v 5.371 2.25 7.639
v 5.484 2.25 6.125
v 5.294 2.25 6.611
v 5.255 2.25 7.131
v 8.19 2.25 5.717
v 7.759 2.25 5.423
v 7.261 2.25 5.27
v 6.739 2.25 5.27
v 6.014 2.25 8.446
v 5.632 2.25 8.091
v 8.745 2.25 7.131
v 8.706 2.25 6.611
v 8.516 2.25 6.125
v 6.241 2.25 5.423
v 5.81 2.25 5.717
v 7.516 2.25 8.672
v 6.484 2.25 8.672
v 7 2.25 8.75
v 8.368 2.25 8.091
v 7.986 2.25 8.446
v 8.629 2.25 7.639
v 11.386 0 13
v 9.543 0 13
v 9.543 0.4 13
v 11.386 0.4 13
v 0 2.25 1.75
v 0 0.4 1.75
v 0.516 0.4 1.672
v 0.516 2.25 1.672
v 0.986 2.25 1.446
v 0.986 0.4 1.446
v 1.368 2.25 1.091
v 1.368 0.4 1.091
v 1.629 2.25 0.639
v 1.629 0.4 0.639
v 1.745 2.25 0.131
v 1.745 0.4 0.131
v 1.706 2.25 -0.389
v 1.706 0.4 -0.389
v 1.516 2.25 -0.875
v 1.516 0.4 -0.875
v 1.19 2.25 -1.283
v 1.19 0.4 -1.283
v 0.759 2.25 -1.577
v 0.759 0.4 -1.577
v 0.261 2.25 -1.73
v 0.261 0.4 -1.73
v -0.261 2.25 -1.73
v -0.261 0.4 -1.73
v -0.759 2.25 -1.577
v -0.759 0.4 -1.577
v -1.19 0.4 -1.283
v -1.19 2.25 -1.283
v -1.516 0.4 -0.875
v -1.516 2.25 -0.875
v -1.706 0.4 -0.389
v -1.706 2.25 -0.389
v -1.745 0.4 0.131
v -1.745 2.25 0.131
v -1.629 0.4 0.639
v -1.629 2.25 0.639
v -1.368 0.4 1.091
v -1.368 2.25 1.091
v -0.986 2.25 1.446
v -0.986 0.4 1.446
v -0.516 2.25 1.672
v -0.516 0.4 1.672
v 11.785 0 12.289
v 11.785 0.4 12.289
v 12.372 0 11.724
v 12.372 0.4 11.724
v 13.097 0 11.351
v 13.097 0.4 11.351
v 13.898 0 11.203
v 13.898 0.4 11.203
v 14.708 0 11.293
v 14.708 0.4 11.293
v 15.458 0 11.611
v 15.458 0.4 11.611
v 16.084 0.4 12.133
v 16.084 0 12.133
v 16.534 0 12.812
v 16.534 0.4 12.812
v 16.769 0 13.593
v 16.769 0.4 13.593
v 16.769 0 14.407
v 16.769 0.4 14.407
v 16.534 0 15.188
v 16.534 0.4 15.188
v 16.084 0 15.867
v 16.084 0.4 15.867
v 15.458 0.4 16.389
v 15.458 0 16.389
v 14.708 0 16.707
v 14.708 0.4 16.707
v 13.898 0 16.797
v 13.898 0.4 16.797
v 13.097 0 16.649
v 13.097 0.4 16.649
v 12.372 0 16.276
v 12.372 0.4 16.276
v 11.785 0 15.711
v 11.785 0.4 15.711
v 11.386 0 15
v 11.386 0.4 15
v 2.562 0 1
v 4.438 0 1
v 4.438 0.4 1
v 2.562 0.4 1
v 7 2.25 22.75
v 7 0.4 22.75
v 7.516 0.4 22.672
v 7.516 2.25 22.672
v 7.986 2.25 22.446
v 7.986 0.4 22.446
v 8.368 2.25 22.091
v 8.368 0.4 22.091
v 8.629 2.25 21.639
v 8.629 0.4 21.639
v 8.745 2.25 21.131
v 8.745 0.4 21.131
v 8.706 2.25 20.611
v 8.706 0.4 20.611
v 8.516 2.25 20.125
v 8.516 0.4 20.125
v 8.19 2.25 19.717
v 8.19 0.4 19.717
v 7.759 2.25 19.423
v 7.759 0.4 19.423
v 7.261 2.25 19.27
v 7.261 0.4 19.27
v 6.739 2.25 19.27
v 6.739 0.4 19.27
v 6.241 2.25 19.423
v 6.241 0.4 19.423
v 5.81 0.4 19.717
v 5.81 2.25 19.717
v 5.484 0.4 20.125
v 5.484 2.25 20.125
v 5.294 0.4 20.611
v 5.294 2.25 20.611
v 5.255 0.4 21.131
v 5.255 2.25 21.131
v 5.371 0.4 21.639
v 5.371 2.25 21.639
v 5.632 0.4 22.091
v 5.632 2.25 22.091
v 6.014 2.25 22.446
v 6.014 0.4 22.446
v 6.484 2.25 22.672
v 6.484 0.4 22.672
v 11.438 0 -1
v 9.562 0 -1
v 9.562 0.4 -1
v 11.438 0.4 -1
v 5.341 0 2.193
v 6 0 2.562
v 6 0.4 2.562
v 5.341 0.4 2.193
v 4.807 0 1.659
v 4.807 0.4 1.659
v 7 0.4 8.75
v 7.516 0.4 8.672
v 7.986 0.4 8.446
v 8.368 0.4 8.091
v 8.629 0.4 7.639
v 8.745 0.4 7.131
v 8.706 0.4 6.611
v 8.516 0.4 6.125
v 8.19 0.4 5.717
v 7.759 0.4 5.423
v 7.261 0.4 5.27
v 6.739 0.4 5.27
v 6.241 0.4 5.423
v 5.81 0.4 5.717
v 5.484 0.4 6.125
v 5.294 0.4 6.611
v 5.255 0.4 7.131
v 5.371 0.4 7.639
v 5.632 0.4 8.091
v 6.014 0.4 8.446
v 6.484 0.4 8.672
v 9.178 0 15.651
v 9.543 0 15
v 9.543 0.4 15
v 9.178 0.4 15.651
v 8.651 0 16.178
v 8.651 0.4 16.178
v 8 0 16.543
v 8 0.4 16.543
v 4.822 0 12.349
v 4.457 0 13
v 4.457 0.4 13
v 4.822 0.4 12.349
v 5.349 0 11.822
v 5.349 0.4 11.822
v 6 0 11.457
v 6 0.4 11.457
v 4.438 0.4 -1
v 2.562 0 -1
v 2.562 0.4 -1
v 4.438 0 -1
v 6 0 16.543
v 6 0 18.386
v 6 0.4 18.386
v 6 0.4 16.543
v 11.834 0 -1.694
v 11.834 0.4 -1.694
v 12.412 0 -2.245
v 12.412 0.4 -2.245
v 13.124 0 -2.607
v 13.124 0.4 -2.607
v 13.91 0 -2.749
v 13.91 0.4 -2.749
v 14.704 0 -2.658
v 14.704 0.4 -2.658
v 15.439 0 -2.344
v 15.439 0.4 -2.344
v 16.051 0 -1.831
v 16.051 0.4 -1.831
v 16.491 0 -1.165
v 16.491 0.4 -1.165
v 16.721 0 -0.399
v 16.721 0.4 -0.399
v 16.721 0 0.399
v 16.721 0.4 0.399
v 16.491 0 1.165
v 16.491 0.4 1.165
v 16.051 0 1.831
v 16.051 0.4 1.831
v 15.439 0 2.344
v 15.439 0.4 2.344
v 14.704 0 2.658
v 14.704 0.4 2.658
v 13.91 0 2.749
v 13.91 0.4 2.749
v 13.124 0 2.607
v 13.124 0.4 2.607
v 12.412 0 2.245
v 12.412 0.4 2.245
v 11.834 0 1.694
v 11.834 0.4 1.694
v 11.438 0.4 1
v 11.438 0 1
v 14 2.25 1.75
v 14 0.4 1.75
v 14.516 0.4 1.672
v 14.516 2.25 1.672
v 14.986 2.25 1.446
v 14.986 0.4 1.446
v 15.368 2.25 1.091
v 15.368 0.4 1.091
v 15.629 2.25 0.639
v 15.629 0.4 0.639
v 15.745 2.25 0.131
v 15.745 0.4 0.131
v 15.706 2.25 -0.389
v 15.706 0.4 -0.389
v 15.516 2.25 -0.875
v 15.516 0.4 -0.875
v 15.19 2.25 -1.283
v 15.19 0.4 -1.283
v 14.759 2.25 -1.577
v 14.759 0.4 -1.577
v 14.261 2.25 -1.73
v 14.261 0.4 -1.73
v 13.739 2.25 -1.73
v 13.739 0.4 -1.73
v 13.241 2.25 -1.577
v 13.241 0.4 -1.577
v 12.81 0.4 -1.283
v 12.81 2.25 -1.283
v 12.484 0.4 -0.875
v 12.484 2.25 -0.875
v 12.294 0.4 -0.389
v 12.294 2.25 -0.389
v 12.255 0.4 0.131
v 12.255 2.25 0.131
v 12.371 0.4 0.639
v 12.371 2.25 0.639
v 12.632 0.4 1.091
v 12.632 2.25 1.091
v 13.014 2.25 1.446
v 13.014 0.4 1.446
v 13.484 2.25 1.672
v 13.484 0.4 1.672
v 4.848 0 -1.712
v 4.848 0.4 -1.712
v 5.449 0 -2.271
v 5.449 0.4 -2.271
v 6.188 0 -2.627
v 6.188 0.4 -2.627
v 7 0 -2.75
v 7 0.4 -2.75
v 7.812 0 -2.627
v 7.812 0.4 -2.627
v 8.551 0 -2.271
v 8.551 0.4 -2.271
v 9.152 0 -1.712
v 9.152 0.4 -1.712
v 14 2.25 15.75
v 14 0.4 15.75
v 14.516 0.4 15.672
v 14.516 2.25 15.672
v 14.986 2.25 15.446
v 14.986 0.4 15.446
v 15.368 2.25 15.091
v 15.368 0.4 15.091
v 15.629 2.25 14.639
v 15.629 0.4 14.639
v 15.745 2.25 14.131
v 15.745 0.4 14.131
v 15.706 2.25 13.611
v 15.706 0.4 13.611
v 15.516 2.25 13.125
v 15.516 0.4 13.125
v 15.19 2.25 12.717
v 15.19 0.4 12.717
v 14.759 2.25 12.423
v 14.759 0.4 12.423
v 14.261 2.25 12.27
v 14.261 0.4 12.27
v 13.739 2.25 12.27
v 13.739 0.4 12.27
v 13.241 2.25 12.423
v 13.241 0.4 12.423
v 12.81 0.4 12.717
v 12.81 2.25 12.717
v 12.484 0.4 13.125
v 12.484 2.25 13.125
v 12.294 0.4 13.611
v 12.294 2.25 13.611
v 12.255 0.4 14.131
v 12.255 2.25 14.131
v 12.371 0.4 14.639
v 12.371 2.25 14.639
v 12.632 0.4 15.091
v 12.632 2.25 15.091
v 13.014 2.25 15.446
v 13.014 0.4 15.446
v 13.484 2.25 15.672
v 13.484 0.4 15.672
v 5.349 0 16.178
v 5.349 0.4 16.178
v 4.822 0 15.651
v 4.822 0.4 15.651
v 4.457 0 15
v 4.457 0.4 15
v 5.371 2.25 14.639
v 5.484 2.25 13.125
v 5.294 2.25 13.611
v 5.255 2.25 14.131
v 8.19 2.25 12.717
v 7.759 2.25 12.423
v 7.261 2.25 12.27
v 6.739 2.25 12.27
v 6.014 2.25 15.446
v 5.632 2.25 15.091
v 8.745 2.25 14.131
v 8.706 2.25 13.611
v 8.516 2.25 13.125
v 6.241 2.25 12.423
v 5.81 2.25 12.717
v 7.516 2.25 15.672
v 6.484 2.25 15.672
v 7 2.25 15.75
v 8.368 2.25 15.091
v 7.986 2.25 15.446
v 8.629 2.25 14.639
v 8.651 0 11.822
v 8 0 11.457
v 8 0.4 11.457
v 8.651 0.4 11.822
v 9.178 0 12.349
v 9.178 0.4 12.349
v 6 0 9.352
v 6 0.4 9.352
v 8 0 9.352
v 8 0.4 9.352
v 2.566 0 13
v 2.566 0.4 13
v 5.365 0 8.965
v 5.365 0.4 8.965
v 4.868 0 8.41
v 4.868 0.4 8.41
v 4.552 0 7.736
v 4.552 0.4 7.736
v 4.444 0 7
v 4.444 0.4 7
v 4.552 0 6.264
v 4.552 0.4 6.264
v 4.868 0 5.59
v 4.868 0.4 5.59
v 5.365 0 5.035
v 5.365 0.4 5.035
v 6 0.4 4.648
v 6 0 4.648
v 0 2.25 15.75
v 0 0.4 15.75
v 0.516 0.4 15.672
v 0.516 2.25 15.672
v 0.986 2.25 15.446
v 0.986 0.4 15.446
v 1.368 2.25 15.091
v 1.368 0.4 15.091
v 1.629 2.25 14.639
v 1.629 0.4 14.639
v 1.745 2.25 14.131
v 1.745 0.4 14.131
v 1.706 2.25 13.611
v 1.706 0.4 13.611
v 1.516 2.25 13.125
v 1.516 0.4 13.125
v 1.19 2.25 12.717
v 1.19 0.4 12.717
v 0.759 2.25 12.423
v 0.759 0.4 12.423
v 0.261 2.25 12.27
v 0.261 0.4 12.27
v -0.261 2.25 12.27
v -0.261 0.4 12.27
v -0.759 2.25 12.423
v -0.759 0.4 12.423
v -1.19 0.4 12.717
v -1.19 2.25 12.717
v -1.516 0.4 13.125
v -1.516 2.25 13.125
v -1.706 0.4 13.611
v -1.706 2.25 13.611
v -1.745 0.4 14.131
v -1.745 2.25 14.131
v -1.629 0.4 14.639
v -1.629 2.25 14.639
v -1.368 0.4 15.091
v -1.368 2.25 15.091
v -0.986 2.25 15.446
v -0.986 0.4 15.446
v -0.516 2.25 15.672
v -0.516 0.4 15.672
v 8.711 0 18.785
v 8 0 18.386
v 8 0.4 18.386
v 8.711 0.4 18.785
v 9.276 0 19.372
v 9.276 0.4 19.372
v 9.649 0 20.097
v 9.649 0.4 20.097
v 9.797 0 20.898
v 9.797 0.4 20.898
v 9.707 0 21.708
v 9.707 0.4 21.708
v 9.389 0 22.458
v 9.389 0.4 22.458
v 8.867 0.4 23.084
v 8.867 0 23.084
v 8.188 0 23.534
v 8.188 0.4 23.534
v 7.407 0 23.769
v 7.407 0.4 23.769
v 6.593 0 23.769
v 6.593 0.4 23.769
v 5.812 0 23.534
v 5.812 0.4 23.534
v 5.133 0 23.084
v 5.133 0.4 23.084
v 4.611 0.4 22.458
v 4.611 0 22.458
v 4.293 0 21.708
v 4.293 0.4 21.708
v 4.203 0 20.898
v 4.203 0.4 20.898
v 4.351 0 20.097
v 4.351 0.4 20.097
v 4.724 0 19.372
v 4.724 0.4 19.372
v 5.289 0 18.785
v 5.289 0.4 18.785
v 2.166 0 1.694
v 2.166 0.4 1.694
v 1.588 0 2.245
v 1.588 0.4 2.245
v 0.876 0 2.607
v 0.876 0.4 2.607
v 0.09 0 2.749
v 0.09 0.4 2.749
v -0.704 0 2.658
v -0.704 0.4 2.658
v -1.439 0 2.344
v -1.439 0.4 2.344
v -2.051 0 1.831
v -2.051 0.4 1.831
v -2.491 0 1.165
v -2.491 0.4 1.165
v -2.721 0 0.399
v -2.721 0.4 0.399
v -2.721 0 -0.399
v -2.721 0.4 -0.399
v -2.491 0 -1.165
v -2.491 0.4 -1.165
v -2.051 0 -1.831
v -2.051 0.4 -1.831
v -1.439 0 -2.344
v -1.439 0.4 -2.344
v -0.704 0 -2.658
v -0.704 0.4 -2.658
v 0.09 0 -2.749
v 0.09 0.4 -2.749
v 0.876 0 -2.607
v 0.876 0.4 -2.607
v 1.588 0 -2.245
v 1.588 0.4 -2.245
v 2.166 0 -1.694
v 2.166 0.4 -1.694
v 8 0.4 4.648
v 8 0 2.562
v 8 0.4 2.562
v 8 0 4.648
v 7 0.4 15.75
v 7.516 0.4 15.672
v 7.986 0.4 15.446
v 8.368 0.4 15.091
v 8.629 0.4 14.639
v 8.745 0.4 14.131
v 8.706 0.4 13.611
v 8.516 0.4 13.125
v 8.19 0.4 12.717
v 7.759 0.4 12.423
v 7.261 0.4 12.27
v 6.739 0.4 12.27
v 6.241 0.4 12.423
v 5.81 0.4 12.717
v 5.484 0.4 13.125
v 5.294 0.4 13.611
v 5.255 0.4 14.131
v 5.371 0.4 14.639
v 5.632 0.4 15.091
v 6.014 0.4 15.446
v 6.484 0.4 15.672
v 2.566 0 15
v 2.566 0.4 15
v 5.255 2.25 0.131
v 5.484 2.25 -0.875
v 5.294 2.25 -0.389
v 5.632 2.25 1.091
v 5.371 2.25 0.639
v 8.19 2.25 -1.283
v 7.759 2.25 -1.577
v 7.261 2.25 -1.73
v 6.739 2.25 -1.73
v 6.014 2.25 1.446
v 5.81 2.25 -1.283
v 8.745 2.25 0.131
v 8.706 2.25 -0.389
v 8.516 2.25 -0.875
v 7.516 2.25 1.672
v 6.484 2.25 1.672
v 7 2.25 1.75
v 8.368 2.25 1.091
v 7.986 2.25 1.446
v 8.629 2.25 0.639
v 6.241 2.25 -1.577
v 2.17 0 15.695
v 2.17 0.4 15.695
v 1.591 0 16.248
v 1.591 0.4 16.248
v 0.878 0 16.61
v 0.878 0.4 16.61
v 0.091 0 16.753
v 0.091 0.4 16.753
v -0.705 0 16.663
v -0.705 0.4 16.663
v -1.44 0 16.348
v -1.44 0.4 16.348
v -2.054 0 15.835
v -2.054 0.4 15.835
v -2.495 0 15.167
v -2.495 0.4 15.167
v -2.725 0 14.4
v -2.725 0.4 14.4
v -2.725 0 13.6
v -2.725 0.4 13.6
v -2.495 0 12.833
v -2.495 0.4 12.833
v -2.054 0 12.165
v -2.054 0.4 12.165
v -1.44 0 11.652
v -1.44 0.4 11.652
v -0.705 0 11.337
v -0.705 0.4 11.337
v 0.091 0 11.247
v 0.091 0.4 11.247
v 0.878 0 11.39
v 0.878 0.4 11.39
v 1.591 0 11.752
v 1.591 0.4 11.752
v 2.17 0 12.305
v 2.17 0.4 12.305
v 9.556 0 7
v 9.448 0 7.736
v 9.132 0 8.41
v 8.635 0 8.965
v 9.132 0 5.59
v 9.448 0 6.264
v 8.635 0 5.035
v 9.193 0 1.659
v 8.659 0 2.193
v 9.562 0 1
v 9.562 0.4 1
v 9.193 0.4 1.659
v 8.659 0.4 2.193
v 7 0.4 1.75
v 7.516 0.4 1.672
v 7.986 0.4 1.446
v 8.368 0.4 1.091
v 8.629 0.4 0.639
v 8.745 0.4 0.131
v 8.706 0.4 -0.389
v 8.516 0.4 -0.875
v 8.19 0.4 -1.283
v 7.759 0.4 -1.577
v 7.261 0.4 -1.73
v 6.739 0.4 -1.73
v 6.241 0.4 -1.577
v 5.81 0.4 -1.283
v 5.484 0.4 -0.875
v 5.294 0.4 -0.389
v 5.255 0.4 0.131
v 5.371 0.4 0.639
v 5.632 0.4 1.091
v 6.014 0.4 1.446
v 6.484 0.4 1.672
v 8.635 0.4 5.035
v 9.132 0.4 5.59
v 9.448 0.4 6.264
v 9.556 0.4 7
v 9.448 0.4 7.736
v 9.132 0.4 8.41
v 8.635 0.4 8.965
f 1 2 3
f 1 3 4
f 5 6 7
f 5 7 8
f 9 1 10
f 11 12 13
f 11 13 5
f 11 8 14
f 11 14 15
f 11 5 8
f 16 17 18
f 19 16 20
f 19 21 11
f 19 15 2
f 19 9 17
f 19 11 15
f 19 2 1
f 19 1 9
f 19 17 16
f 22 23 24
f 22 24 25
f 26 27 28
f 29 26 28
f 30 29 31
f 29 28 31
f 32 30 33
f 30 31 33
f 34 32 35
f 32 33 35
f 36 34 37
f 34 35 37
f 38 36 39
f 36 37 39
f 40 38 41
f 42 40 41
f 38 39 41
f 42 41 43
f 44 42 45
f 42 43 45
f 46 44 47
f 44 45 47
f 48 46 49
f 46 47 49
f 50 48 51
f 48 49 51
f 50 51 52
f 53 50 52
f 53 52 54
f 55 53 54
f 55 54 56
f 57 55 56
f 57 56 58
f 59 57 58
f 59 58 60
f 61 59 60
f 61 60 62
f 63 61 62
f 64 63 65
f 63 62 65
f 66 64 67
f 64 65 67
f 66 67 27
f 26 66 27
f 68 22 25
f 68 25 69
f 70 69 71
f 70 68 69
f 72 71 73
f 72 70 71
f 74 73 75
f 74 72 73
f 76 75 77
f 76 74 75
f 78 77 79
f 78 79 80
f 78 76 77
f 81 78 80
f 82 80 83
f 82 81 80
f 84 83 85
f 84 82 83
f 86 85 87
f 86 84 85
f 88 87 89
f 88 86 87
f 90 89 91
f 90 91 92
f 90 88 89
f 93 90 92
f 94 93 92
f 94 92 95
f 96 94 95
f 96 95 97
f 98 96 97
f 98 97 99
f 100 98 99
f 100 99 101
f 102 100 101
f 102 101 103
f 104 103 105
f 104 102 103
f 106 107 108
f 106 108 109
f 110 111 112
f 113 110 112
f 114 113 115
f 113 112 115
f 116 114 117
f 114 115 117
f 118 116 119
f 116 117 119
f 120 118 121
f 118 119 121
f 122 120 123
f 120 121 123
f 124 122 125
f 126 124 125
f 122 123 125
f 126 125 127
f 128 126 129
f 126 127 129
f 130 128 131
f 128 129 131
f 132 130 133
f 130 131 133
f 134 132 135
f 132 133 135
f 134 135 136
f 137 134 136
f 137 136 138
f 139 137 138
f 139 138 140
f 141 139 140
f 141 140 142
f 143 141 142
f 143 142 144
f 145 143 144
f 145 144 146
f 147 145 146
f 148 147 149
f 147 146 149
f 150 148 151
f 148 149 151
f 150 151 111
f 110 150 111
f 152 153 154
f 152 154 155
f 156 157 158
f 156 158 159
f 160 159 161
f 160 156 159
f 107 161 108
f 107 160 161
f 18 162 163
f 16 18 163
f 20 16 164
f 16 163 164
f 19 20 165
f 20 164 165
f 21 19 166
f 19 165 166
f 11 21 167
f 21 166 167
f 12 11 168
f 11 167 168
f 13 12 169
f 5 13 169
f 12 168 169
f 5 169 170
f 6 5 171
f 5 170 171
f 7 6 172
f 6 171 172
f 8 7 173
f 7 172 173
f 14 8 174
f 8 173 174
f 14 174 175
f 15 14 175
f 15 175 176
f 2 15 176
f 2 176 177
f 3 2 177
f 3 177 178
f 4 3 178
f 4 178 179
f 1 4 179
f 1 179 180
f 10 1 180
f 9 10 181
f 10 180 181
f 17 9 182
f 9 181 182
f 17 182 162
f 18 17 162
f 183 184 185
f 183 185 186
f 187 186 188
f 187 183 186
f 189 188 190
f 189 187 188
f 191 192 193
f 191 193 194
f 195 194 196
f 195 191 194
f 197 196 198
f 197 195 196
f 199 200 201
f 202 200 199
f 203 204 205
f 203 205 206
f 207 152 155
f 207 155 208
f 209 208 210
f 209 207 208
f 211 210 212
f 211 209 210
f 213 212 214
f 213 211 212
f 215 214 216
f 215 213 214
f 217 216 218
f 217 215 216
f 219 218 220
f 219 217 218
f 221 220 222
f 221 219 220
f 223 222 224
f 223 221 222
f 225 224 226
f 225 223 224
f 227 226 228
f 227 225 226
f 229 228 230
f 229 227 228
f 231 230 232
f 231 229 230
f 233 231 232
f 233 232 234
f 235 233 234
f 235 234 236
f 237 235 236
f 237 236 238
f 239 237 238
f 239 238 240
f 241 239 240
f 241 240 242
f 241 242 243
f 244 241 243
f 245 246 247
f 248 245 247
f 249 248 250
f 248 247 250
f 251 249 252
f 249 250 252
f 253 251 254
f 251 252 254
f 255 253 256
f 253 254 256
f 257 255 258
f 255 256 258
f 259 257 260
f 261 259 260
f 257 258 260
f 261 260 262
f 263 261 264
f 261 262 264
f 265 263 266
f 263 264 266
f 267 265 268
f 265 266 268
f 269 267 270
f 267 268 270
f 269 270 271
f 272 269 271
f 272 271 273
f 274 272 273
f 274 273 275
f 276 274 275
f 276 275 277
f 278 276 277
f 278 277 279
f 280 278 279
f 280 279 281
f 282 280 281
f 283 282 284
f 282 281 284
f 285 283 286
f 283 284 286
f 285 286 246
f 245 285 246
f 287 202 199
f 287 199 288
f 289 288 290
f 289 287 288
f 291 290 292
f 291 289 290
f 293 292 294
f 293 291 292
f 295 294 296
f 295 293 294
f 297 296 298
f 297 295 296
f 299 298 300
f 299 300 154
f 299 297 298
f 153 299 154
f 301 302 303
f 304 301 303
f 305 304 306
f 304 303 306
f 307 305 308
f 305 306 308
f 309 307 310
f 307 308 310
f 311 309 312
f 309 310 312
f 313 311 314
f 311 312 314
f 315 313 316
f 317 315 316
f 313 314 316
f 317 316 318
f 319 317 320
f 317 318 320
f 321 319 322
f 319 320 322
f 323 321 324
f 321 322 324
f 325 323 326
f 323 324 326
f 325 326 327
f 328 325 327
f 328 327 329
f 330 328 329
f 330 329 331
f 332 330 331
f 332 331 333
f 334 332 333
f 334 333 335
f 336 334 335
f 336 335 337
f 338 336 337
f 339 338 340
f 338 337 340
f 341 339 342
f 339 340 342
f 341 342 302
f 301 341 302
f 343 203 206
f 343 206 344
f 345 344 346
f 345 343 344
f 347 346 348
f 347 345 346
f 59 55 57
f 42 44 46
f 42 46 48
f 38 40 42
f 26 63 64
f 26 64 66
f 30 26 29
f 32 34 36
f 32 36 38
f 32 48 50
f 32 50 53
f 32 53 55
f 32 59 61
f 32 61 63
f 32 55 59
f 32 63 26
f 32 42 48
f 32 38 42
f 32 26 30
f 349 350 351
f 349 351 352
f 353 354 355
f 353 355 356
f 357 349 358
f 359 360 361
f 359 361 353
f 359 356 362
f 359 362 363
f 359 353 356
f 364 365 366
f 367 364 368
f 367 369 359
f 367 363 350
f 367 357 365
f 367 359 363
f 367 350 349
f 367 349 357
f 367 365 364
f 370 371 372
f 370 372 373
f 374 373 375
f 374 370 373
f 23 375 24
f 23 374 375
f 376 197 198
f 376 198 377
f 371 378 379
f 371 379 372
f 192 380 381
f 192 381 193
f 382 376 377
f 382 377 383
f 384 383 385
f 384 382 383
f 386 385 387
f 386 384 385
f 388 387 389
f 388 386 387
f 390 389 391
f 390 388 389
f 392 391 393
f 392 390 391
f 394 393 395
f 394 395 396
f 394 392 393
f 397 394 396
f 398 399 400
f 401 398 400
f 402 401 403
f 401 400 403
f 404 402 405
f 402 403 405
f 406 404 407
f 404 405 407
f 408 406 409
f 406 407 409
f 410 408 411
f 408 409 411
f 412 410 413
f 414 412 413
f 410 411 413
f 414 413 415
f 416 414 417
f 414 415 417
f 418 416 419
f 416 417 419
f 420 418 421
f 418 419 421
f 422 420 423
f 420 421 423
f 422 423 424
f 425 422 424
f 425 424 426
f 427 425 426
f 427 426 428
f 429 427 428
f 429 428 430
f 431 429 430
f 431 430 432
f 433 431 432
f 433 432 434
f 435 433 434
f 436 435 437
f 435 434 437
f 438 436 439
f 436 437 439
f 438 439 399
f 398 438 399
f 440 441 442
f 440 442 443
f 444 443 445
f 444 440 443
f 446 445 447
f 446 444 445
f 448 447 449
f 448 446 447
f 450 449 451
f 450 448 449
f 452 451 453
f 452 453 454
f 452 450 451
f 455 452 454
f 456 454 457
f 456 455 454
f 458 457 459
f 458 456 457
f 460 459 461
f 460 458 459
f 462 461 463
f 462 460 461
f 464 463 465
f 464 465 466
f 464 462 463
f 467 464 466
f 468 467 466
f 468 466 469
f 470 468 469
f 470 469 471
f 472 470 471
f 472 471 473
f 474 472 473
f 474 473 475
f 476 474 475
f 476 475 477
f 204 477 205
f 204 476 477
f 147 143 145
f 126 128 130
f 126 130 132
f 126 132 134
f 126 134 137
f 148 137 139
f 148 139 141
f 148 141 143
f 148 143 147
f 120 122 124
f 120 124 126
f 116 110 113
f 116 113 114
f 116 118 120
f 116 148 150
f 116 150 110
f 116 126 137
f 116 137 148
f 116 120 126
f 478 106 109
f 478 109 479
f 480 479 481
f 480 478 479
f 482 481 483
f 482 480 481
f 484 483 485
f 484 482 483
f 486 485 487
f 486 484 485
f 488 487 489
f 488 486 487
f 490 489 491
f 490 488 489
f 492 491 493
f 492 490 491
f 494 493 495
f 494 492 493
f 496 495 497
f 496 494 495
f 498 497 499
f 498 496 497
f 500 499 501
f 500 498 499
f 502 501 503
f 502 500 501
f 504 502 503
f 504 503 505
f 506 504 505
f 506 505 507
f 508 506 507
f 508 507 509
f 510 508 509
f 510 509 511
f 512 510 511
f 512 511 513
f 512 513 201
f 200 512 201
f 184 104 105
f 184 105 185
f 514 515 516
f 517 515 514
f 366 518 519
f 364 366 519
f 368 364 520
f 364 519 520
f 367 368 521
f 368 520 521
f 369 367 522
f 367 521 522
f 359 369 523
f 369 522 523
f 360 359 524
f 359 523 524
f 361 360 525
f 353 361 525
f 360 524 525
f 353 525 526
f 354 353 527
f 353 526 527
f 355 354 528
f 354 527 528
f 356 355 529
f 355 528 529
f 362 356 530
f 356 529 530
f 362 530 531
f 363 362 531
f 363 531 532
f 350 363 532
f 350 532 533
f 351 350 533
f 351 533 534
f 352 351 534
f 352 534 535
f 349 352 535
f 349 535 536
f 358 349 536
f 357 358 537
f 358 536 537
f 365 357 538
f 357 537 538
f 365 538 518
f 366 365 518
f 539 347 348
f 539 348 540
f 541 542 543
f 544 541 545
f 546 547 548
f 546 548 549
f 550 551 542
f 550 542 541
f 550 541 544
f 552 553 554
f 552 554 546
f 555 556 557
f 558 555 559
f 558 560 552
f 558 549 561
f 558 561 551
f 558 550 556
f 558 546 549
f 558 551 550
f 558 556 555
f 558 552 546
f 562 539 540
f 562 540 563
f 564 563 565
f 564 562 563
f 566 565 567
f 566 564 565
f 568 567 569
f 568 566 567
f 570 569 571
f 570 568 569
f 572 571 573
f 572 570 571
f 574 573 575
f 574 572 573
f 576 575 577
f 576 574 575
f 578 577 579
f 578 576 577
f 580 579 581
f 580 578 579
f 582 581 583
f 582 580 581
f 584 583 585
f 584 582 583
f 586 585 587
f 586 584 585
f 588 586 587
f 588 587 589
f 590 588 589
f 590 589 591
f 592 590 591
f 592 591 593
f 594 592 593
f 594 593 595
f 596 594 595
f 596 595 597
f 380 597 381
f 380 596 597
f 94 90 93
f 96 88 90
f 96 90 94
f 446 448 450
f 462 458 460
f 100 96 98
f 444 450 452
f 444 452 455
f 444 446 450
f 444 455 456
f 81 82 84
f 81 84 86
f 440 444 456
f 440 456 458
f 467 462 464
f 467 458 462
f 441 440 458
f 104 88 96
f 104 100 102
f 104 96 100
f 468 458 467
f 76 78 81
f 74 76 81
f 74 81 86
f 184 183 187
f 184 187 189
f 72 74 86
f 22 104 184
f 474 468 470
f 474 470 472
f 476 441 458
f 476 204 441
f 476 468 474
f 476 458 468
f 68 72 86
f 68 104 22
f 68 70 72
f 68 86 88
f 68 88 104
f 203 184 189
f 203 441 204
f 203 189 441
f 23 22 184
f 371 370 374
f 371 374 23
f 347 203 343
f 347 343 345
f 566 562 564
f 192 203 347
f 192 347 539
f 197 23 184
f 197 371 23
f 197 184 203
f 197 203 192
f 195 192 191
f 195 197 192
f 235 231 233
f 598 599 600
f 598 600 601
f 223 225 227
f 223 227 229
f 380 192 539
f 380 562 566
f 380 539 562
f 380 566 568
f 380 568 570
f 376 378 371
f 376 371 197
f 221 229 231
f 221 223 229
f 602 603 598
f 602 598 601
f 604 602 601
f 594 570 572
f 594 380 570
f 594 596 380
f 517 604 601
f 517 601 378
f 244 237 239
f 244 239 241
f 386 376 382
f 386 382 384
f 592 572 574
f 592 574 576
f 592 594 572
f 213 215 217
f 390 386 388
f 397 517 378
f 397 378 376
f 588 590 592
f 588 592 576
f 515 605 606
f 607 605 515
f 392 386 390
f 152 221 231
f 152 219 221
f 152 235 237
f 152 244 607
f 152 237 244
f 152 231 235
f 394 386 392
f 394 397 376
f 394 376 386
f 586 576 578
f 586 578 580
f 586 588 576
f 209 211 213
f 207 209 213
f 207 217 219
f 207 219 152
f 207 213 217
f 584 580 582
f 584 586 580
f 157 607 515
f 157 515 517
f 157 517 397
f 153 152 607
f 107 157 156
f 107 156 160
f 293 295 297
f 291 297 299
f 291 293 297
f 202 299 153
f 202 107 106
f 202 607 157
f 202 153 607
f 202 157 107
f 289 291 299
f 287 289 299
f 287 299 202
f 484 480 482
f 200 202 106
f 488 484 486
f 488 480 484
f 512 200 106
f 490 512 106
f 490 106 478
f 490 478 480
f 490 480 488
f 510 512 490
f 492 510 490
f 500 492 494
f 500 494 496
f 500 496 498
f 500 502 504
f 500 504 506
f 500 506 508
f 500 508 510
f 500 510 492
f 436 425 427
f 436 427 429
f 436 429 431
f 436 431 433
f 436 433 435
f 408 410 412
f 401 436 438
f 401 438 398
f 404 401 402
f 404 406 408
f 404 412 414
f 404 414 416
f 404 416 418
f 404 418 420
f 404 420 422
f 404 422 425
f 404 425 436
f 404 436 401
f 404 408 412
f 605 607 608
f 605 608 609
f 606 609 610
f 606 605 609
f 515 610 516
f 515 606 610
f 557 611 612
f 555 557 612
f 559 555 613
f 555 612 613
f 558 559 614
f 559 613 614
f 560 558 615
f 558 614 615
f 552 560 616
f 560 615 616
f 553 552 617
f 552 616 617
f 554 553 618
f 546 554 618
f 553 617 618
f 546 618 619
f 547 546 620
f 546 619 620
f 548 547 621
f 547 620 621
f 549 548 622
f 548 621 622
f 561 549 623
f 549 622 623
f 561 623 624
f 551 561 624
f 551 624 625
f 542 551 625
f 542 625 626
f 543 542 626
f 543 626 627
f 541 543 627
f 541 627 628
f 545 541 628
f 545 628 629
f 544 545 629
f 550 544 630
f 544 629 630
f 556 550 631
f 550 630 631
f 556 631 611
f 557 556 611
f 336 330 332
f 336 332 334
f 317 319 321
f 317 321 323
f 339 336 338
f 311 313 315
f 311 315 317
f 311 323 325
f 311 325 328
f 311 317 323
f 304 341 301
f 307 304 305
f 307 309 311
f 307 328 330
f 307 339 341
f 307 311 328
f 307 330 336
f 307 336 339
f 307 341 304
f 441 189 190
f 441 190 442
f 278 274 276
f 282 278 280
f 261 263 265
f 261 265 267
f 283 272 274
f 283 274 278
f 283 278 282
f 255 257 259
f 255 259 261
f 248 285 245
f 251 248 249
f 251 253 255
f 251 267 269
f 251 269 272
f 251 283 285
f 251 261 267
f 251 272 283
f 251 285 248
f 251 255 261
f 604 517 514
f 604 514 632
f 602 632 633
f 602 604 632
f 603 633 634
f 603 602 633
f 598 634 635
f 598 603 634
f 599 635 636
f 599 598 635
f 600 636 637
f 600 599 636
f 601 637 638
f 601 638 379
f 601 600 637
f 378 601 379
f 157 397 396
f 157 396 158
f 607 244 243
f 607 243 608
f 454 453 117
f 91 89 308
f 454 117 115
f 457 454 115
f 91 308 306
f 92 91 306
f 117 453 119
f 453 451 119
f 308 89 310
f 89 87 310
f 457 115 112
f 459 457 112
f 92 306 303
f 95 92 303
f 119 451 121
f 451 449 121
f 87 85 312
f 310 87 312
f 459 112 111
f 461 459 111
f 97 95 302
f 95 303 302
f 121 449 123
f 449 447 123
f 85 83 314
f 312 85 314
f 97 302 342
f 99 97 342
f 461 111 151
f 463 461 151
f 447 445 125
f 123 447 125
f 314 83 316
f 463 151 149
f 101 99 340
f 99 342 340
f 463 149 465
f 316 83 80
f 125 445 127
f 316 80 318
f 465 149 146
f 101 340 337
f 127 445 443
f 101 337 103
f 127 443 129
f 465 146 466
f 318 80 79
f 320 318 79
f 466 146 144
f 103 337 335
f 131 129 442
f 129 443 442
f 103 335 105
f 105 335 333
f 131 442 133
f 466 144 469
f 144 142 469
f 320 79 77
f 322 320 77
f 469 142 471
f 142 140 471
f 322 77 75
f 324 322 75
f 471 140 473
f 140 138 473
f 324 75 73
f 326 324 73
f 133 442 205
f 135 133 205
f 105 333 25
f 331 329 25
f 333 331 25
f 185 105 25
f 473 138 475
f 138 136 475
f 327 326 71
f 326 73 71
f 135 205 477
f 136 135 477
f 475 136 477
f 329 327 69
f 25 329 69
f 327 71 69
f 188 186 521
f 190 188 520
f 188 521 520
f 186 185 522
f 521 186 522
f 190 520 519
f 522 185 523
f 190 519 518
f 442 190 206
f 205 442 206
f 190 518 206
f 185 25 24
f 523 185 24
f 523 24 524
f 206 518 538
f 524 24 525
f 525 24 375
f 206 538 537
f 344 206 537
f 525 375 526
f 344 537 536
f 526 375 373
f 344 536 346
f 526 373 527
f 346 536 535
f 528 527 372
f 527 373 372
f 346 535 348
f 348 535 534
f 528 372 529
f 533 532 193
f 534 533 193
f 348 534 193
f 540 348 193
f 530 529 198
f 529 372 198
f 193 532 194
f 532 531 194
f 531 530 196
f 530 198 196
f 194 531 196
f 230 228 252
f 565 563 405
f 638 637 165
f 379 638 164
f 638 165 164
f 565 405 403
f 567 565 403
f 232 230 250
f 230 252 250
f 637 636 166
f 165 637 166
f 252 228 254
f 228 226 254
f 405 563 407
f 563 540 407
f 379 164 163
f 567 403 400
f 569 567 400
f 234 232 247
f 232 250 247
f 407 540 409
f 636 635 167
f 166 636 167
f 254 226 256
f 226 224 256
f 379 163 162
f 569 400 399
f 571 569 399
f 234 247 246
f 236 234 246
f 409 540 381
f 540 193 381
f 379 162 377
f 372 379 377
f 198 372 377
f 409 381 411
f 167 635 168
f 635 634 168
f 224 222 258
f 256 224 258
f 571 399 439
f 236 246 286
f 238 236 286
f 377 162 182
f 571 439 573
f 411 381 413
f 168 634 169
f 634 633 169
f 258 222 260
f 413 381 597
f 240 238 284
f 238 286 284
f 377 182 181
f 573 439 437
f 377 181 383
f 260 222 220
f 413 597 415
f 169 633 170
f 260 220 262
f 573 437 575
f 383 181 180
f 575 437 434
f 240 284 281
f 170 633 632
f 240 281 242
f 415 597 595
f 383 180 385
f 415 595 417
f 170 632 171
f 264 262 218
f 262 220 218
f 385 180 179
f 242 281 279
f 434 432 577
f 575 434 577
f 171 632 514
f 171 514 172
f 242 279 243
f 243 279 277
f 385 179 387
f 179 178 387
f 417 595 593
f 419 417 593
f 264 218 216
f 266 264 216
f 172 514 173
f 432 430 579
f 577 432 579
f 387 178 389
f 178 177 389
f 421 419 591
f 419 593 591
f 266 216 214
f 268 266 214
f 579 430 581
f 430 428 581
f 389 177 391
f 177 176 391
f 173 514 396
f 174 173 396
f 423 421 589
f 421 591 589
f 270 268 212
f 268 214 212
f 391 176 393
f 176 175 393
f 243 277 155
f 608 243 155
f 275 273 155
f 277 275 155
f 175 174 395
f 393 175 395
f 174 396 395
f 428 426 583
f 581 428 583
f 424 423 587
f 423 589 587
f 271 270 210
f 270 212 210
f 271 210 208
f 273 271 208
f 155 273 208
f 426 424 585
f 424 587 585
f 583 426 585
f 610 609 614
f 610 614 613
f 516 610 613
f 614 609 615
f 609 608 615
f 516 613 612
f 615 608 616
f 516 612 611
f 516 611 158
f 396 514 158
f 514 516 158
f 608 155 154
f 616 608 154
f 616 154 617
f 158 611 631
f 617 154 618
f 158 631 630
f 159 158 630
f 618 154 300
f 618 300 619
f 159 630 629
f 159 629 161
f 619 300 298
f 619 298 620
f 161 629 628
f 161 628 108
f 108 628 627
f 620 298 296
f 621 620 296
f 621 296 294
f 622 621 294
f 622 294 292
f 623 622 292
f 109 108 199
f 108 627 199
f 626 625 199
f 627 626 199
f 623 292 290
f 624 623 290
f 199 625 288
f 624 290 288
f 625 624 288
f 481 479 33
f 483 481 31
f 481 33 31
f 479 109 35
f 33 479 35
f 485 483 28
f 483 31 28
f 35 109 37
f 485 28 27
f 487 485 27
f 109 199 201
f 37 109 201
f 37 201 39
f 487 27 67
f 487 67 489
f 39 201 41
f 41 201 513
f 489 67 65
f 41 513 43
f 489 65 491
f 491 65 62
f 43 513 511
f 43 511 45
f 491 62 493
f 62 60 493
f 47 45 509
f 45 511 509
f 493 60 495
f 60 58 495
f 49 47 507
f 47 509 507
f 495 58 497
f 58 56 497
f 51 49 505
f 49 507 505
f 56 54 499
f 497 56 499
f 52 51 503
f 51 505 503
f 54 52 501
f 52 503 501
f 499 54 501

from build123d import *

# Parameters (mm, degrees)
BOSS_EXTRUDE1_DEPTH = 0.4
SKETCH2_R           = 1.75
BOSS_EXTRUDE2_DEPTH = 1.85


with BuildPart() as part:
    # Sketch1 → Boss-Extrude1 (new body)
    with BuildSketch(Plane(origin=(0, 0, 0), x_dir=(1, 0, 0), z_dir=(0, 1, 0))):
        with BuildLine():
            Line((2.561737691, 1), (4.438262309, 1))
            ThreePointArc((4.438262309, 1), (7, 2.75), (9.561737691, 1))
            Line((9.561737691, 1), (11.438262309, 1))
            ThreePointArc((11.438262309, 1), (16.75, 0), (11.438262309, -1))
            Line((11.438262309, -1), (9.561737691, -1))
            ThreePointArc((9.561737691, -1), (8.944543648, -1.944543648), (8, -2.561737691))
            Line((8, -2.561737691), (8, -4.647588392))
            ThreePointArc((8, -4.647588392), (9.556137785, -7), (8, -9.352411608))
            Line((8, -9.352411608), (8, -11.456717793))
            ThreePointArc((8, -11.456717793), (8.932392867, -12.067607133), (9.543282207, -13))
            Line((9.543282207, -13), (11.386254927, -13))
            ThreePointArc((11.386254927, -13), (16.798510909, -14), (11.386254927, -15))
            Line((11.386254927, -15), (9.543282207, -15))
            ThreePointArc((9.543282207, -15), (8.932392867, -15.932392867), (8, -16.543282207))
            Line((8, -16.543282207), (8, -18.386254927))
            ThreePointArc((8, -18.386254927), (7, -23.798510909), (6, -18.386254927))
            Line((6, -18.386254927), (6, -16.543282207))
            ThreePointArc((6, -16.543282207), (5.067607133, -15.932392867), (4.456717793, -15))
            Line((4.456717793, -15), (2.566233649, -15))
            ThreePointArc((2.566233649, -15), (-2.754188654, -14), (2.566233649, -13))
            Line((2.566233649, -13), (4.456717793, -13))
            ThreePointArc((4.456717793, -13), (5.067607133, -12.067607133), (6, -11.456717793))
            Line((6, -11.456717793), (6, -9.352411608))
            ThreePointArc((6, -9.352411608), (4.443862215, -7), (6, -4.647588392))
            Line((6, -4.647588392), (6, -2.561737691))
            ThreePointArc((6, -2.561737691), (5.055456352, -1.944543648), (4.438262309, -1))
            Line((4.438262309, -1), (2.561737691, -1))
            ThreePointArc((2.561737691, -1), (-2.75, 0), (2.561737691, 1))
        make_face()
    extrude(amount=BOSS_EXTRUDE1_DEPTH)

    # Sketch2 → Boss-Extrude2 (add)
    with BuildSketch(Plane(origin=(0, 0.4, 0), x_dir=(1, 0, 0), z_dir=(0, 1, 0))):
        with Locations(Location((0, 0, 0), (0, 0, 270))):
            Circle(SKETCH2_R)
        with Locations(Location((7, 0, 0), (0, 0, 270))):
            Circle(SKETCH2_R)
        with Locations(Location((14, 0, 0), (0, 0, 270))):
            Circle(SKETCH2_R)
        with Locations(Location((7, -7, 0), (0, 0, 270))):
            Circle(SKETCH2_R)
        with Locations(Location((7, -14, 0), (0, 0, 270))):
            Circle(SKETCH2_R)
        with Locations(Location((14, -14, 0), (0, 0, 270))):
            Circle(SKETCH2_R)
        with Locations(Location((0, -14, 0), (0, 0, 270))):
            Circle(SKETCH2_R)
        with Locations(Location((7, -21, 0), (0, 0, 270))):
            Circle(SKETCH2_R)
    extrude(amount=BOSS_EXTRUDE2_DEPTH)


solid = part.part
